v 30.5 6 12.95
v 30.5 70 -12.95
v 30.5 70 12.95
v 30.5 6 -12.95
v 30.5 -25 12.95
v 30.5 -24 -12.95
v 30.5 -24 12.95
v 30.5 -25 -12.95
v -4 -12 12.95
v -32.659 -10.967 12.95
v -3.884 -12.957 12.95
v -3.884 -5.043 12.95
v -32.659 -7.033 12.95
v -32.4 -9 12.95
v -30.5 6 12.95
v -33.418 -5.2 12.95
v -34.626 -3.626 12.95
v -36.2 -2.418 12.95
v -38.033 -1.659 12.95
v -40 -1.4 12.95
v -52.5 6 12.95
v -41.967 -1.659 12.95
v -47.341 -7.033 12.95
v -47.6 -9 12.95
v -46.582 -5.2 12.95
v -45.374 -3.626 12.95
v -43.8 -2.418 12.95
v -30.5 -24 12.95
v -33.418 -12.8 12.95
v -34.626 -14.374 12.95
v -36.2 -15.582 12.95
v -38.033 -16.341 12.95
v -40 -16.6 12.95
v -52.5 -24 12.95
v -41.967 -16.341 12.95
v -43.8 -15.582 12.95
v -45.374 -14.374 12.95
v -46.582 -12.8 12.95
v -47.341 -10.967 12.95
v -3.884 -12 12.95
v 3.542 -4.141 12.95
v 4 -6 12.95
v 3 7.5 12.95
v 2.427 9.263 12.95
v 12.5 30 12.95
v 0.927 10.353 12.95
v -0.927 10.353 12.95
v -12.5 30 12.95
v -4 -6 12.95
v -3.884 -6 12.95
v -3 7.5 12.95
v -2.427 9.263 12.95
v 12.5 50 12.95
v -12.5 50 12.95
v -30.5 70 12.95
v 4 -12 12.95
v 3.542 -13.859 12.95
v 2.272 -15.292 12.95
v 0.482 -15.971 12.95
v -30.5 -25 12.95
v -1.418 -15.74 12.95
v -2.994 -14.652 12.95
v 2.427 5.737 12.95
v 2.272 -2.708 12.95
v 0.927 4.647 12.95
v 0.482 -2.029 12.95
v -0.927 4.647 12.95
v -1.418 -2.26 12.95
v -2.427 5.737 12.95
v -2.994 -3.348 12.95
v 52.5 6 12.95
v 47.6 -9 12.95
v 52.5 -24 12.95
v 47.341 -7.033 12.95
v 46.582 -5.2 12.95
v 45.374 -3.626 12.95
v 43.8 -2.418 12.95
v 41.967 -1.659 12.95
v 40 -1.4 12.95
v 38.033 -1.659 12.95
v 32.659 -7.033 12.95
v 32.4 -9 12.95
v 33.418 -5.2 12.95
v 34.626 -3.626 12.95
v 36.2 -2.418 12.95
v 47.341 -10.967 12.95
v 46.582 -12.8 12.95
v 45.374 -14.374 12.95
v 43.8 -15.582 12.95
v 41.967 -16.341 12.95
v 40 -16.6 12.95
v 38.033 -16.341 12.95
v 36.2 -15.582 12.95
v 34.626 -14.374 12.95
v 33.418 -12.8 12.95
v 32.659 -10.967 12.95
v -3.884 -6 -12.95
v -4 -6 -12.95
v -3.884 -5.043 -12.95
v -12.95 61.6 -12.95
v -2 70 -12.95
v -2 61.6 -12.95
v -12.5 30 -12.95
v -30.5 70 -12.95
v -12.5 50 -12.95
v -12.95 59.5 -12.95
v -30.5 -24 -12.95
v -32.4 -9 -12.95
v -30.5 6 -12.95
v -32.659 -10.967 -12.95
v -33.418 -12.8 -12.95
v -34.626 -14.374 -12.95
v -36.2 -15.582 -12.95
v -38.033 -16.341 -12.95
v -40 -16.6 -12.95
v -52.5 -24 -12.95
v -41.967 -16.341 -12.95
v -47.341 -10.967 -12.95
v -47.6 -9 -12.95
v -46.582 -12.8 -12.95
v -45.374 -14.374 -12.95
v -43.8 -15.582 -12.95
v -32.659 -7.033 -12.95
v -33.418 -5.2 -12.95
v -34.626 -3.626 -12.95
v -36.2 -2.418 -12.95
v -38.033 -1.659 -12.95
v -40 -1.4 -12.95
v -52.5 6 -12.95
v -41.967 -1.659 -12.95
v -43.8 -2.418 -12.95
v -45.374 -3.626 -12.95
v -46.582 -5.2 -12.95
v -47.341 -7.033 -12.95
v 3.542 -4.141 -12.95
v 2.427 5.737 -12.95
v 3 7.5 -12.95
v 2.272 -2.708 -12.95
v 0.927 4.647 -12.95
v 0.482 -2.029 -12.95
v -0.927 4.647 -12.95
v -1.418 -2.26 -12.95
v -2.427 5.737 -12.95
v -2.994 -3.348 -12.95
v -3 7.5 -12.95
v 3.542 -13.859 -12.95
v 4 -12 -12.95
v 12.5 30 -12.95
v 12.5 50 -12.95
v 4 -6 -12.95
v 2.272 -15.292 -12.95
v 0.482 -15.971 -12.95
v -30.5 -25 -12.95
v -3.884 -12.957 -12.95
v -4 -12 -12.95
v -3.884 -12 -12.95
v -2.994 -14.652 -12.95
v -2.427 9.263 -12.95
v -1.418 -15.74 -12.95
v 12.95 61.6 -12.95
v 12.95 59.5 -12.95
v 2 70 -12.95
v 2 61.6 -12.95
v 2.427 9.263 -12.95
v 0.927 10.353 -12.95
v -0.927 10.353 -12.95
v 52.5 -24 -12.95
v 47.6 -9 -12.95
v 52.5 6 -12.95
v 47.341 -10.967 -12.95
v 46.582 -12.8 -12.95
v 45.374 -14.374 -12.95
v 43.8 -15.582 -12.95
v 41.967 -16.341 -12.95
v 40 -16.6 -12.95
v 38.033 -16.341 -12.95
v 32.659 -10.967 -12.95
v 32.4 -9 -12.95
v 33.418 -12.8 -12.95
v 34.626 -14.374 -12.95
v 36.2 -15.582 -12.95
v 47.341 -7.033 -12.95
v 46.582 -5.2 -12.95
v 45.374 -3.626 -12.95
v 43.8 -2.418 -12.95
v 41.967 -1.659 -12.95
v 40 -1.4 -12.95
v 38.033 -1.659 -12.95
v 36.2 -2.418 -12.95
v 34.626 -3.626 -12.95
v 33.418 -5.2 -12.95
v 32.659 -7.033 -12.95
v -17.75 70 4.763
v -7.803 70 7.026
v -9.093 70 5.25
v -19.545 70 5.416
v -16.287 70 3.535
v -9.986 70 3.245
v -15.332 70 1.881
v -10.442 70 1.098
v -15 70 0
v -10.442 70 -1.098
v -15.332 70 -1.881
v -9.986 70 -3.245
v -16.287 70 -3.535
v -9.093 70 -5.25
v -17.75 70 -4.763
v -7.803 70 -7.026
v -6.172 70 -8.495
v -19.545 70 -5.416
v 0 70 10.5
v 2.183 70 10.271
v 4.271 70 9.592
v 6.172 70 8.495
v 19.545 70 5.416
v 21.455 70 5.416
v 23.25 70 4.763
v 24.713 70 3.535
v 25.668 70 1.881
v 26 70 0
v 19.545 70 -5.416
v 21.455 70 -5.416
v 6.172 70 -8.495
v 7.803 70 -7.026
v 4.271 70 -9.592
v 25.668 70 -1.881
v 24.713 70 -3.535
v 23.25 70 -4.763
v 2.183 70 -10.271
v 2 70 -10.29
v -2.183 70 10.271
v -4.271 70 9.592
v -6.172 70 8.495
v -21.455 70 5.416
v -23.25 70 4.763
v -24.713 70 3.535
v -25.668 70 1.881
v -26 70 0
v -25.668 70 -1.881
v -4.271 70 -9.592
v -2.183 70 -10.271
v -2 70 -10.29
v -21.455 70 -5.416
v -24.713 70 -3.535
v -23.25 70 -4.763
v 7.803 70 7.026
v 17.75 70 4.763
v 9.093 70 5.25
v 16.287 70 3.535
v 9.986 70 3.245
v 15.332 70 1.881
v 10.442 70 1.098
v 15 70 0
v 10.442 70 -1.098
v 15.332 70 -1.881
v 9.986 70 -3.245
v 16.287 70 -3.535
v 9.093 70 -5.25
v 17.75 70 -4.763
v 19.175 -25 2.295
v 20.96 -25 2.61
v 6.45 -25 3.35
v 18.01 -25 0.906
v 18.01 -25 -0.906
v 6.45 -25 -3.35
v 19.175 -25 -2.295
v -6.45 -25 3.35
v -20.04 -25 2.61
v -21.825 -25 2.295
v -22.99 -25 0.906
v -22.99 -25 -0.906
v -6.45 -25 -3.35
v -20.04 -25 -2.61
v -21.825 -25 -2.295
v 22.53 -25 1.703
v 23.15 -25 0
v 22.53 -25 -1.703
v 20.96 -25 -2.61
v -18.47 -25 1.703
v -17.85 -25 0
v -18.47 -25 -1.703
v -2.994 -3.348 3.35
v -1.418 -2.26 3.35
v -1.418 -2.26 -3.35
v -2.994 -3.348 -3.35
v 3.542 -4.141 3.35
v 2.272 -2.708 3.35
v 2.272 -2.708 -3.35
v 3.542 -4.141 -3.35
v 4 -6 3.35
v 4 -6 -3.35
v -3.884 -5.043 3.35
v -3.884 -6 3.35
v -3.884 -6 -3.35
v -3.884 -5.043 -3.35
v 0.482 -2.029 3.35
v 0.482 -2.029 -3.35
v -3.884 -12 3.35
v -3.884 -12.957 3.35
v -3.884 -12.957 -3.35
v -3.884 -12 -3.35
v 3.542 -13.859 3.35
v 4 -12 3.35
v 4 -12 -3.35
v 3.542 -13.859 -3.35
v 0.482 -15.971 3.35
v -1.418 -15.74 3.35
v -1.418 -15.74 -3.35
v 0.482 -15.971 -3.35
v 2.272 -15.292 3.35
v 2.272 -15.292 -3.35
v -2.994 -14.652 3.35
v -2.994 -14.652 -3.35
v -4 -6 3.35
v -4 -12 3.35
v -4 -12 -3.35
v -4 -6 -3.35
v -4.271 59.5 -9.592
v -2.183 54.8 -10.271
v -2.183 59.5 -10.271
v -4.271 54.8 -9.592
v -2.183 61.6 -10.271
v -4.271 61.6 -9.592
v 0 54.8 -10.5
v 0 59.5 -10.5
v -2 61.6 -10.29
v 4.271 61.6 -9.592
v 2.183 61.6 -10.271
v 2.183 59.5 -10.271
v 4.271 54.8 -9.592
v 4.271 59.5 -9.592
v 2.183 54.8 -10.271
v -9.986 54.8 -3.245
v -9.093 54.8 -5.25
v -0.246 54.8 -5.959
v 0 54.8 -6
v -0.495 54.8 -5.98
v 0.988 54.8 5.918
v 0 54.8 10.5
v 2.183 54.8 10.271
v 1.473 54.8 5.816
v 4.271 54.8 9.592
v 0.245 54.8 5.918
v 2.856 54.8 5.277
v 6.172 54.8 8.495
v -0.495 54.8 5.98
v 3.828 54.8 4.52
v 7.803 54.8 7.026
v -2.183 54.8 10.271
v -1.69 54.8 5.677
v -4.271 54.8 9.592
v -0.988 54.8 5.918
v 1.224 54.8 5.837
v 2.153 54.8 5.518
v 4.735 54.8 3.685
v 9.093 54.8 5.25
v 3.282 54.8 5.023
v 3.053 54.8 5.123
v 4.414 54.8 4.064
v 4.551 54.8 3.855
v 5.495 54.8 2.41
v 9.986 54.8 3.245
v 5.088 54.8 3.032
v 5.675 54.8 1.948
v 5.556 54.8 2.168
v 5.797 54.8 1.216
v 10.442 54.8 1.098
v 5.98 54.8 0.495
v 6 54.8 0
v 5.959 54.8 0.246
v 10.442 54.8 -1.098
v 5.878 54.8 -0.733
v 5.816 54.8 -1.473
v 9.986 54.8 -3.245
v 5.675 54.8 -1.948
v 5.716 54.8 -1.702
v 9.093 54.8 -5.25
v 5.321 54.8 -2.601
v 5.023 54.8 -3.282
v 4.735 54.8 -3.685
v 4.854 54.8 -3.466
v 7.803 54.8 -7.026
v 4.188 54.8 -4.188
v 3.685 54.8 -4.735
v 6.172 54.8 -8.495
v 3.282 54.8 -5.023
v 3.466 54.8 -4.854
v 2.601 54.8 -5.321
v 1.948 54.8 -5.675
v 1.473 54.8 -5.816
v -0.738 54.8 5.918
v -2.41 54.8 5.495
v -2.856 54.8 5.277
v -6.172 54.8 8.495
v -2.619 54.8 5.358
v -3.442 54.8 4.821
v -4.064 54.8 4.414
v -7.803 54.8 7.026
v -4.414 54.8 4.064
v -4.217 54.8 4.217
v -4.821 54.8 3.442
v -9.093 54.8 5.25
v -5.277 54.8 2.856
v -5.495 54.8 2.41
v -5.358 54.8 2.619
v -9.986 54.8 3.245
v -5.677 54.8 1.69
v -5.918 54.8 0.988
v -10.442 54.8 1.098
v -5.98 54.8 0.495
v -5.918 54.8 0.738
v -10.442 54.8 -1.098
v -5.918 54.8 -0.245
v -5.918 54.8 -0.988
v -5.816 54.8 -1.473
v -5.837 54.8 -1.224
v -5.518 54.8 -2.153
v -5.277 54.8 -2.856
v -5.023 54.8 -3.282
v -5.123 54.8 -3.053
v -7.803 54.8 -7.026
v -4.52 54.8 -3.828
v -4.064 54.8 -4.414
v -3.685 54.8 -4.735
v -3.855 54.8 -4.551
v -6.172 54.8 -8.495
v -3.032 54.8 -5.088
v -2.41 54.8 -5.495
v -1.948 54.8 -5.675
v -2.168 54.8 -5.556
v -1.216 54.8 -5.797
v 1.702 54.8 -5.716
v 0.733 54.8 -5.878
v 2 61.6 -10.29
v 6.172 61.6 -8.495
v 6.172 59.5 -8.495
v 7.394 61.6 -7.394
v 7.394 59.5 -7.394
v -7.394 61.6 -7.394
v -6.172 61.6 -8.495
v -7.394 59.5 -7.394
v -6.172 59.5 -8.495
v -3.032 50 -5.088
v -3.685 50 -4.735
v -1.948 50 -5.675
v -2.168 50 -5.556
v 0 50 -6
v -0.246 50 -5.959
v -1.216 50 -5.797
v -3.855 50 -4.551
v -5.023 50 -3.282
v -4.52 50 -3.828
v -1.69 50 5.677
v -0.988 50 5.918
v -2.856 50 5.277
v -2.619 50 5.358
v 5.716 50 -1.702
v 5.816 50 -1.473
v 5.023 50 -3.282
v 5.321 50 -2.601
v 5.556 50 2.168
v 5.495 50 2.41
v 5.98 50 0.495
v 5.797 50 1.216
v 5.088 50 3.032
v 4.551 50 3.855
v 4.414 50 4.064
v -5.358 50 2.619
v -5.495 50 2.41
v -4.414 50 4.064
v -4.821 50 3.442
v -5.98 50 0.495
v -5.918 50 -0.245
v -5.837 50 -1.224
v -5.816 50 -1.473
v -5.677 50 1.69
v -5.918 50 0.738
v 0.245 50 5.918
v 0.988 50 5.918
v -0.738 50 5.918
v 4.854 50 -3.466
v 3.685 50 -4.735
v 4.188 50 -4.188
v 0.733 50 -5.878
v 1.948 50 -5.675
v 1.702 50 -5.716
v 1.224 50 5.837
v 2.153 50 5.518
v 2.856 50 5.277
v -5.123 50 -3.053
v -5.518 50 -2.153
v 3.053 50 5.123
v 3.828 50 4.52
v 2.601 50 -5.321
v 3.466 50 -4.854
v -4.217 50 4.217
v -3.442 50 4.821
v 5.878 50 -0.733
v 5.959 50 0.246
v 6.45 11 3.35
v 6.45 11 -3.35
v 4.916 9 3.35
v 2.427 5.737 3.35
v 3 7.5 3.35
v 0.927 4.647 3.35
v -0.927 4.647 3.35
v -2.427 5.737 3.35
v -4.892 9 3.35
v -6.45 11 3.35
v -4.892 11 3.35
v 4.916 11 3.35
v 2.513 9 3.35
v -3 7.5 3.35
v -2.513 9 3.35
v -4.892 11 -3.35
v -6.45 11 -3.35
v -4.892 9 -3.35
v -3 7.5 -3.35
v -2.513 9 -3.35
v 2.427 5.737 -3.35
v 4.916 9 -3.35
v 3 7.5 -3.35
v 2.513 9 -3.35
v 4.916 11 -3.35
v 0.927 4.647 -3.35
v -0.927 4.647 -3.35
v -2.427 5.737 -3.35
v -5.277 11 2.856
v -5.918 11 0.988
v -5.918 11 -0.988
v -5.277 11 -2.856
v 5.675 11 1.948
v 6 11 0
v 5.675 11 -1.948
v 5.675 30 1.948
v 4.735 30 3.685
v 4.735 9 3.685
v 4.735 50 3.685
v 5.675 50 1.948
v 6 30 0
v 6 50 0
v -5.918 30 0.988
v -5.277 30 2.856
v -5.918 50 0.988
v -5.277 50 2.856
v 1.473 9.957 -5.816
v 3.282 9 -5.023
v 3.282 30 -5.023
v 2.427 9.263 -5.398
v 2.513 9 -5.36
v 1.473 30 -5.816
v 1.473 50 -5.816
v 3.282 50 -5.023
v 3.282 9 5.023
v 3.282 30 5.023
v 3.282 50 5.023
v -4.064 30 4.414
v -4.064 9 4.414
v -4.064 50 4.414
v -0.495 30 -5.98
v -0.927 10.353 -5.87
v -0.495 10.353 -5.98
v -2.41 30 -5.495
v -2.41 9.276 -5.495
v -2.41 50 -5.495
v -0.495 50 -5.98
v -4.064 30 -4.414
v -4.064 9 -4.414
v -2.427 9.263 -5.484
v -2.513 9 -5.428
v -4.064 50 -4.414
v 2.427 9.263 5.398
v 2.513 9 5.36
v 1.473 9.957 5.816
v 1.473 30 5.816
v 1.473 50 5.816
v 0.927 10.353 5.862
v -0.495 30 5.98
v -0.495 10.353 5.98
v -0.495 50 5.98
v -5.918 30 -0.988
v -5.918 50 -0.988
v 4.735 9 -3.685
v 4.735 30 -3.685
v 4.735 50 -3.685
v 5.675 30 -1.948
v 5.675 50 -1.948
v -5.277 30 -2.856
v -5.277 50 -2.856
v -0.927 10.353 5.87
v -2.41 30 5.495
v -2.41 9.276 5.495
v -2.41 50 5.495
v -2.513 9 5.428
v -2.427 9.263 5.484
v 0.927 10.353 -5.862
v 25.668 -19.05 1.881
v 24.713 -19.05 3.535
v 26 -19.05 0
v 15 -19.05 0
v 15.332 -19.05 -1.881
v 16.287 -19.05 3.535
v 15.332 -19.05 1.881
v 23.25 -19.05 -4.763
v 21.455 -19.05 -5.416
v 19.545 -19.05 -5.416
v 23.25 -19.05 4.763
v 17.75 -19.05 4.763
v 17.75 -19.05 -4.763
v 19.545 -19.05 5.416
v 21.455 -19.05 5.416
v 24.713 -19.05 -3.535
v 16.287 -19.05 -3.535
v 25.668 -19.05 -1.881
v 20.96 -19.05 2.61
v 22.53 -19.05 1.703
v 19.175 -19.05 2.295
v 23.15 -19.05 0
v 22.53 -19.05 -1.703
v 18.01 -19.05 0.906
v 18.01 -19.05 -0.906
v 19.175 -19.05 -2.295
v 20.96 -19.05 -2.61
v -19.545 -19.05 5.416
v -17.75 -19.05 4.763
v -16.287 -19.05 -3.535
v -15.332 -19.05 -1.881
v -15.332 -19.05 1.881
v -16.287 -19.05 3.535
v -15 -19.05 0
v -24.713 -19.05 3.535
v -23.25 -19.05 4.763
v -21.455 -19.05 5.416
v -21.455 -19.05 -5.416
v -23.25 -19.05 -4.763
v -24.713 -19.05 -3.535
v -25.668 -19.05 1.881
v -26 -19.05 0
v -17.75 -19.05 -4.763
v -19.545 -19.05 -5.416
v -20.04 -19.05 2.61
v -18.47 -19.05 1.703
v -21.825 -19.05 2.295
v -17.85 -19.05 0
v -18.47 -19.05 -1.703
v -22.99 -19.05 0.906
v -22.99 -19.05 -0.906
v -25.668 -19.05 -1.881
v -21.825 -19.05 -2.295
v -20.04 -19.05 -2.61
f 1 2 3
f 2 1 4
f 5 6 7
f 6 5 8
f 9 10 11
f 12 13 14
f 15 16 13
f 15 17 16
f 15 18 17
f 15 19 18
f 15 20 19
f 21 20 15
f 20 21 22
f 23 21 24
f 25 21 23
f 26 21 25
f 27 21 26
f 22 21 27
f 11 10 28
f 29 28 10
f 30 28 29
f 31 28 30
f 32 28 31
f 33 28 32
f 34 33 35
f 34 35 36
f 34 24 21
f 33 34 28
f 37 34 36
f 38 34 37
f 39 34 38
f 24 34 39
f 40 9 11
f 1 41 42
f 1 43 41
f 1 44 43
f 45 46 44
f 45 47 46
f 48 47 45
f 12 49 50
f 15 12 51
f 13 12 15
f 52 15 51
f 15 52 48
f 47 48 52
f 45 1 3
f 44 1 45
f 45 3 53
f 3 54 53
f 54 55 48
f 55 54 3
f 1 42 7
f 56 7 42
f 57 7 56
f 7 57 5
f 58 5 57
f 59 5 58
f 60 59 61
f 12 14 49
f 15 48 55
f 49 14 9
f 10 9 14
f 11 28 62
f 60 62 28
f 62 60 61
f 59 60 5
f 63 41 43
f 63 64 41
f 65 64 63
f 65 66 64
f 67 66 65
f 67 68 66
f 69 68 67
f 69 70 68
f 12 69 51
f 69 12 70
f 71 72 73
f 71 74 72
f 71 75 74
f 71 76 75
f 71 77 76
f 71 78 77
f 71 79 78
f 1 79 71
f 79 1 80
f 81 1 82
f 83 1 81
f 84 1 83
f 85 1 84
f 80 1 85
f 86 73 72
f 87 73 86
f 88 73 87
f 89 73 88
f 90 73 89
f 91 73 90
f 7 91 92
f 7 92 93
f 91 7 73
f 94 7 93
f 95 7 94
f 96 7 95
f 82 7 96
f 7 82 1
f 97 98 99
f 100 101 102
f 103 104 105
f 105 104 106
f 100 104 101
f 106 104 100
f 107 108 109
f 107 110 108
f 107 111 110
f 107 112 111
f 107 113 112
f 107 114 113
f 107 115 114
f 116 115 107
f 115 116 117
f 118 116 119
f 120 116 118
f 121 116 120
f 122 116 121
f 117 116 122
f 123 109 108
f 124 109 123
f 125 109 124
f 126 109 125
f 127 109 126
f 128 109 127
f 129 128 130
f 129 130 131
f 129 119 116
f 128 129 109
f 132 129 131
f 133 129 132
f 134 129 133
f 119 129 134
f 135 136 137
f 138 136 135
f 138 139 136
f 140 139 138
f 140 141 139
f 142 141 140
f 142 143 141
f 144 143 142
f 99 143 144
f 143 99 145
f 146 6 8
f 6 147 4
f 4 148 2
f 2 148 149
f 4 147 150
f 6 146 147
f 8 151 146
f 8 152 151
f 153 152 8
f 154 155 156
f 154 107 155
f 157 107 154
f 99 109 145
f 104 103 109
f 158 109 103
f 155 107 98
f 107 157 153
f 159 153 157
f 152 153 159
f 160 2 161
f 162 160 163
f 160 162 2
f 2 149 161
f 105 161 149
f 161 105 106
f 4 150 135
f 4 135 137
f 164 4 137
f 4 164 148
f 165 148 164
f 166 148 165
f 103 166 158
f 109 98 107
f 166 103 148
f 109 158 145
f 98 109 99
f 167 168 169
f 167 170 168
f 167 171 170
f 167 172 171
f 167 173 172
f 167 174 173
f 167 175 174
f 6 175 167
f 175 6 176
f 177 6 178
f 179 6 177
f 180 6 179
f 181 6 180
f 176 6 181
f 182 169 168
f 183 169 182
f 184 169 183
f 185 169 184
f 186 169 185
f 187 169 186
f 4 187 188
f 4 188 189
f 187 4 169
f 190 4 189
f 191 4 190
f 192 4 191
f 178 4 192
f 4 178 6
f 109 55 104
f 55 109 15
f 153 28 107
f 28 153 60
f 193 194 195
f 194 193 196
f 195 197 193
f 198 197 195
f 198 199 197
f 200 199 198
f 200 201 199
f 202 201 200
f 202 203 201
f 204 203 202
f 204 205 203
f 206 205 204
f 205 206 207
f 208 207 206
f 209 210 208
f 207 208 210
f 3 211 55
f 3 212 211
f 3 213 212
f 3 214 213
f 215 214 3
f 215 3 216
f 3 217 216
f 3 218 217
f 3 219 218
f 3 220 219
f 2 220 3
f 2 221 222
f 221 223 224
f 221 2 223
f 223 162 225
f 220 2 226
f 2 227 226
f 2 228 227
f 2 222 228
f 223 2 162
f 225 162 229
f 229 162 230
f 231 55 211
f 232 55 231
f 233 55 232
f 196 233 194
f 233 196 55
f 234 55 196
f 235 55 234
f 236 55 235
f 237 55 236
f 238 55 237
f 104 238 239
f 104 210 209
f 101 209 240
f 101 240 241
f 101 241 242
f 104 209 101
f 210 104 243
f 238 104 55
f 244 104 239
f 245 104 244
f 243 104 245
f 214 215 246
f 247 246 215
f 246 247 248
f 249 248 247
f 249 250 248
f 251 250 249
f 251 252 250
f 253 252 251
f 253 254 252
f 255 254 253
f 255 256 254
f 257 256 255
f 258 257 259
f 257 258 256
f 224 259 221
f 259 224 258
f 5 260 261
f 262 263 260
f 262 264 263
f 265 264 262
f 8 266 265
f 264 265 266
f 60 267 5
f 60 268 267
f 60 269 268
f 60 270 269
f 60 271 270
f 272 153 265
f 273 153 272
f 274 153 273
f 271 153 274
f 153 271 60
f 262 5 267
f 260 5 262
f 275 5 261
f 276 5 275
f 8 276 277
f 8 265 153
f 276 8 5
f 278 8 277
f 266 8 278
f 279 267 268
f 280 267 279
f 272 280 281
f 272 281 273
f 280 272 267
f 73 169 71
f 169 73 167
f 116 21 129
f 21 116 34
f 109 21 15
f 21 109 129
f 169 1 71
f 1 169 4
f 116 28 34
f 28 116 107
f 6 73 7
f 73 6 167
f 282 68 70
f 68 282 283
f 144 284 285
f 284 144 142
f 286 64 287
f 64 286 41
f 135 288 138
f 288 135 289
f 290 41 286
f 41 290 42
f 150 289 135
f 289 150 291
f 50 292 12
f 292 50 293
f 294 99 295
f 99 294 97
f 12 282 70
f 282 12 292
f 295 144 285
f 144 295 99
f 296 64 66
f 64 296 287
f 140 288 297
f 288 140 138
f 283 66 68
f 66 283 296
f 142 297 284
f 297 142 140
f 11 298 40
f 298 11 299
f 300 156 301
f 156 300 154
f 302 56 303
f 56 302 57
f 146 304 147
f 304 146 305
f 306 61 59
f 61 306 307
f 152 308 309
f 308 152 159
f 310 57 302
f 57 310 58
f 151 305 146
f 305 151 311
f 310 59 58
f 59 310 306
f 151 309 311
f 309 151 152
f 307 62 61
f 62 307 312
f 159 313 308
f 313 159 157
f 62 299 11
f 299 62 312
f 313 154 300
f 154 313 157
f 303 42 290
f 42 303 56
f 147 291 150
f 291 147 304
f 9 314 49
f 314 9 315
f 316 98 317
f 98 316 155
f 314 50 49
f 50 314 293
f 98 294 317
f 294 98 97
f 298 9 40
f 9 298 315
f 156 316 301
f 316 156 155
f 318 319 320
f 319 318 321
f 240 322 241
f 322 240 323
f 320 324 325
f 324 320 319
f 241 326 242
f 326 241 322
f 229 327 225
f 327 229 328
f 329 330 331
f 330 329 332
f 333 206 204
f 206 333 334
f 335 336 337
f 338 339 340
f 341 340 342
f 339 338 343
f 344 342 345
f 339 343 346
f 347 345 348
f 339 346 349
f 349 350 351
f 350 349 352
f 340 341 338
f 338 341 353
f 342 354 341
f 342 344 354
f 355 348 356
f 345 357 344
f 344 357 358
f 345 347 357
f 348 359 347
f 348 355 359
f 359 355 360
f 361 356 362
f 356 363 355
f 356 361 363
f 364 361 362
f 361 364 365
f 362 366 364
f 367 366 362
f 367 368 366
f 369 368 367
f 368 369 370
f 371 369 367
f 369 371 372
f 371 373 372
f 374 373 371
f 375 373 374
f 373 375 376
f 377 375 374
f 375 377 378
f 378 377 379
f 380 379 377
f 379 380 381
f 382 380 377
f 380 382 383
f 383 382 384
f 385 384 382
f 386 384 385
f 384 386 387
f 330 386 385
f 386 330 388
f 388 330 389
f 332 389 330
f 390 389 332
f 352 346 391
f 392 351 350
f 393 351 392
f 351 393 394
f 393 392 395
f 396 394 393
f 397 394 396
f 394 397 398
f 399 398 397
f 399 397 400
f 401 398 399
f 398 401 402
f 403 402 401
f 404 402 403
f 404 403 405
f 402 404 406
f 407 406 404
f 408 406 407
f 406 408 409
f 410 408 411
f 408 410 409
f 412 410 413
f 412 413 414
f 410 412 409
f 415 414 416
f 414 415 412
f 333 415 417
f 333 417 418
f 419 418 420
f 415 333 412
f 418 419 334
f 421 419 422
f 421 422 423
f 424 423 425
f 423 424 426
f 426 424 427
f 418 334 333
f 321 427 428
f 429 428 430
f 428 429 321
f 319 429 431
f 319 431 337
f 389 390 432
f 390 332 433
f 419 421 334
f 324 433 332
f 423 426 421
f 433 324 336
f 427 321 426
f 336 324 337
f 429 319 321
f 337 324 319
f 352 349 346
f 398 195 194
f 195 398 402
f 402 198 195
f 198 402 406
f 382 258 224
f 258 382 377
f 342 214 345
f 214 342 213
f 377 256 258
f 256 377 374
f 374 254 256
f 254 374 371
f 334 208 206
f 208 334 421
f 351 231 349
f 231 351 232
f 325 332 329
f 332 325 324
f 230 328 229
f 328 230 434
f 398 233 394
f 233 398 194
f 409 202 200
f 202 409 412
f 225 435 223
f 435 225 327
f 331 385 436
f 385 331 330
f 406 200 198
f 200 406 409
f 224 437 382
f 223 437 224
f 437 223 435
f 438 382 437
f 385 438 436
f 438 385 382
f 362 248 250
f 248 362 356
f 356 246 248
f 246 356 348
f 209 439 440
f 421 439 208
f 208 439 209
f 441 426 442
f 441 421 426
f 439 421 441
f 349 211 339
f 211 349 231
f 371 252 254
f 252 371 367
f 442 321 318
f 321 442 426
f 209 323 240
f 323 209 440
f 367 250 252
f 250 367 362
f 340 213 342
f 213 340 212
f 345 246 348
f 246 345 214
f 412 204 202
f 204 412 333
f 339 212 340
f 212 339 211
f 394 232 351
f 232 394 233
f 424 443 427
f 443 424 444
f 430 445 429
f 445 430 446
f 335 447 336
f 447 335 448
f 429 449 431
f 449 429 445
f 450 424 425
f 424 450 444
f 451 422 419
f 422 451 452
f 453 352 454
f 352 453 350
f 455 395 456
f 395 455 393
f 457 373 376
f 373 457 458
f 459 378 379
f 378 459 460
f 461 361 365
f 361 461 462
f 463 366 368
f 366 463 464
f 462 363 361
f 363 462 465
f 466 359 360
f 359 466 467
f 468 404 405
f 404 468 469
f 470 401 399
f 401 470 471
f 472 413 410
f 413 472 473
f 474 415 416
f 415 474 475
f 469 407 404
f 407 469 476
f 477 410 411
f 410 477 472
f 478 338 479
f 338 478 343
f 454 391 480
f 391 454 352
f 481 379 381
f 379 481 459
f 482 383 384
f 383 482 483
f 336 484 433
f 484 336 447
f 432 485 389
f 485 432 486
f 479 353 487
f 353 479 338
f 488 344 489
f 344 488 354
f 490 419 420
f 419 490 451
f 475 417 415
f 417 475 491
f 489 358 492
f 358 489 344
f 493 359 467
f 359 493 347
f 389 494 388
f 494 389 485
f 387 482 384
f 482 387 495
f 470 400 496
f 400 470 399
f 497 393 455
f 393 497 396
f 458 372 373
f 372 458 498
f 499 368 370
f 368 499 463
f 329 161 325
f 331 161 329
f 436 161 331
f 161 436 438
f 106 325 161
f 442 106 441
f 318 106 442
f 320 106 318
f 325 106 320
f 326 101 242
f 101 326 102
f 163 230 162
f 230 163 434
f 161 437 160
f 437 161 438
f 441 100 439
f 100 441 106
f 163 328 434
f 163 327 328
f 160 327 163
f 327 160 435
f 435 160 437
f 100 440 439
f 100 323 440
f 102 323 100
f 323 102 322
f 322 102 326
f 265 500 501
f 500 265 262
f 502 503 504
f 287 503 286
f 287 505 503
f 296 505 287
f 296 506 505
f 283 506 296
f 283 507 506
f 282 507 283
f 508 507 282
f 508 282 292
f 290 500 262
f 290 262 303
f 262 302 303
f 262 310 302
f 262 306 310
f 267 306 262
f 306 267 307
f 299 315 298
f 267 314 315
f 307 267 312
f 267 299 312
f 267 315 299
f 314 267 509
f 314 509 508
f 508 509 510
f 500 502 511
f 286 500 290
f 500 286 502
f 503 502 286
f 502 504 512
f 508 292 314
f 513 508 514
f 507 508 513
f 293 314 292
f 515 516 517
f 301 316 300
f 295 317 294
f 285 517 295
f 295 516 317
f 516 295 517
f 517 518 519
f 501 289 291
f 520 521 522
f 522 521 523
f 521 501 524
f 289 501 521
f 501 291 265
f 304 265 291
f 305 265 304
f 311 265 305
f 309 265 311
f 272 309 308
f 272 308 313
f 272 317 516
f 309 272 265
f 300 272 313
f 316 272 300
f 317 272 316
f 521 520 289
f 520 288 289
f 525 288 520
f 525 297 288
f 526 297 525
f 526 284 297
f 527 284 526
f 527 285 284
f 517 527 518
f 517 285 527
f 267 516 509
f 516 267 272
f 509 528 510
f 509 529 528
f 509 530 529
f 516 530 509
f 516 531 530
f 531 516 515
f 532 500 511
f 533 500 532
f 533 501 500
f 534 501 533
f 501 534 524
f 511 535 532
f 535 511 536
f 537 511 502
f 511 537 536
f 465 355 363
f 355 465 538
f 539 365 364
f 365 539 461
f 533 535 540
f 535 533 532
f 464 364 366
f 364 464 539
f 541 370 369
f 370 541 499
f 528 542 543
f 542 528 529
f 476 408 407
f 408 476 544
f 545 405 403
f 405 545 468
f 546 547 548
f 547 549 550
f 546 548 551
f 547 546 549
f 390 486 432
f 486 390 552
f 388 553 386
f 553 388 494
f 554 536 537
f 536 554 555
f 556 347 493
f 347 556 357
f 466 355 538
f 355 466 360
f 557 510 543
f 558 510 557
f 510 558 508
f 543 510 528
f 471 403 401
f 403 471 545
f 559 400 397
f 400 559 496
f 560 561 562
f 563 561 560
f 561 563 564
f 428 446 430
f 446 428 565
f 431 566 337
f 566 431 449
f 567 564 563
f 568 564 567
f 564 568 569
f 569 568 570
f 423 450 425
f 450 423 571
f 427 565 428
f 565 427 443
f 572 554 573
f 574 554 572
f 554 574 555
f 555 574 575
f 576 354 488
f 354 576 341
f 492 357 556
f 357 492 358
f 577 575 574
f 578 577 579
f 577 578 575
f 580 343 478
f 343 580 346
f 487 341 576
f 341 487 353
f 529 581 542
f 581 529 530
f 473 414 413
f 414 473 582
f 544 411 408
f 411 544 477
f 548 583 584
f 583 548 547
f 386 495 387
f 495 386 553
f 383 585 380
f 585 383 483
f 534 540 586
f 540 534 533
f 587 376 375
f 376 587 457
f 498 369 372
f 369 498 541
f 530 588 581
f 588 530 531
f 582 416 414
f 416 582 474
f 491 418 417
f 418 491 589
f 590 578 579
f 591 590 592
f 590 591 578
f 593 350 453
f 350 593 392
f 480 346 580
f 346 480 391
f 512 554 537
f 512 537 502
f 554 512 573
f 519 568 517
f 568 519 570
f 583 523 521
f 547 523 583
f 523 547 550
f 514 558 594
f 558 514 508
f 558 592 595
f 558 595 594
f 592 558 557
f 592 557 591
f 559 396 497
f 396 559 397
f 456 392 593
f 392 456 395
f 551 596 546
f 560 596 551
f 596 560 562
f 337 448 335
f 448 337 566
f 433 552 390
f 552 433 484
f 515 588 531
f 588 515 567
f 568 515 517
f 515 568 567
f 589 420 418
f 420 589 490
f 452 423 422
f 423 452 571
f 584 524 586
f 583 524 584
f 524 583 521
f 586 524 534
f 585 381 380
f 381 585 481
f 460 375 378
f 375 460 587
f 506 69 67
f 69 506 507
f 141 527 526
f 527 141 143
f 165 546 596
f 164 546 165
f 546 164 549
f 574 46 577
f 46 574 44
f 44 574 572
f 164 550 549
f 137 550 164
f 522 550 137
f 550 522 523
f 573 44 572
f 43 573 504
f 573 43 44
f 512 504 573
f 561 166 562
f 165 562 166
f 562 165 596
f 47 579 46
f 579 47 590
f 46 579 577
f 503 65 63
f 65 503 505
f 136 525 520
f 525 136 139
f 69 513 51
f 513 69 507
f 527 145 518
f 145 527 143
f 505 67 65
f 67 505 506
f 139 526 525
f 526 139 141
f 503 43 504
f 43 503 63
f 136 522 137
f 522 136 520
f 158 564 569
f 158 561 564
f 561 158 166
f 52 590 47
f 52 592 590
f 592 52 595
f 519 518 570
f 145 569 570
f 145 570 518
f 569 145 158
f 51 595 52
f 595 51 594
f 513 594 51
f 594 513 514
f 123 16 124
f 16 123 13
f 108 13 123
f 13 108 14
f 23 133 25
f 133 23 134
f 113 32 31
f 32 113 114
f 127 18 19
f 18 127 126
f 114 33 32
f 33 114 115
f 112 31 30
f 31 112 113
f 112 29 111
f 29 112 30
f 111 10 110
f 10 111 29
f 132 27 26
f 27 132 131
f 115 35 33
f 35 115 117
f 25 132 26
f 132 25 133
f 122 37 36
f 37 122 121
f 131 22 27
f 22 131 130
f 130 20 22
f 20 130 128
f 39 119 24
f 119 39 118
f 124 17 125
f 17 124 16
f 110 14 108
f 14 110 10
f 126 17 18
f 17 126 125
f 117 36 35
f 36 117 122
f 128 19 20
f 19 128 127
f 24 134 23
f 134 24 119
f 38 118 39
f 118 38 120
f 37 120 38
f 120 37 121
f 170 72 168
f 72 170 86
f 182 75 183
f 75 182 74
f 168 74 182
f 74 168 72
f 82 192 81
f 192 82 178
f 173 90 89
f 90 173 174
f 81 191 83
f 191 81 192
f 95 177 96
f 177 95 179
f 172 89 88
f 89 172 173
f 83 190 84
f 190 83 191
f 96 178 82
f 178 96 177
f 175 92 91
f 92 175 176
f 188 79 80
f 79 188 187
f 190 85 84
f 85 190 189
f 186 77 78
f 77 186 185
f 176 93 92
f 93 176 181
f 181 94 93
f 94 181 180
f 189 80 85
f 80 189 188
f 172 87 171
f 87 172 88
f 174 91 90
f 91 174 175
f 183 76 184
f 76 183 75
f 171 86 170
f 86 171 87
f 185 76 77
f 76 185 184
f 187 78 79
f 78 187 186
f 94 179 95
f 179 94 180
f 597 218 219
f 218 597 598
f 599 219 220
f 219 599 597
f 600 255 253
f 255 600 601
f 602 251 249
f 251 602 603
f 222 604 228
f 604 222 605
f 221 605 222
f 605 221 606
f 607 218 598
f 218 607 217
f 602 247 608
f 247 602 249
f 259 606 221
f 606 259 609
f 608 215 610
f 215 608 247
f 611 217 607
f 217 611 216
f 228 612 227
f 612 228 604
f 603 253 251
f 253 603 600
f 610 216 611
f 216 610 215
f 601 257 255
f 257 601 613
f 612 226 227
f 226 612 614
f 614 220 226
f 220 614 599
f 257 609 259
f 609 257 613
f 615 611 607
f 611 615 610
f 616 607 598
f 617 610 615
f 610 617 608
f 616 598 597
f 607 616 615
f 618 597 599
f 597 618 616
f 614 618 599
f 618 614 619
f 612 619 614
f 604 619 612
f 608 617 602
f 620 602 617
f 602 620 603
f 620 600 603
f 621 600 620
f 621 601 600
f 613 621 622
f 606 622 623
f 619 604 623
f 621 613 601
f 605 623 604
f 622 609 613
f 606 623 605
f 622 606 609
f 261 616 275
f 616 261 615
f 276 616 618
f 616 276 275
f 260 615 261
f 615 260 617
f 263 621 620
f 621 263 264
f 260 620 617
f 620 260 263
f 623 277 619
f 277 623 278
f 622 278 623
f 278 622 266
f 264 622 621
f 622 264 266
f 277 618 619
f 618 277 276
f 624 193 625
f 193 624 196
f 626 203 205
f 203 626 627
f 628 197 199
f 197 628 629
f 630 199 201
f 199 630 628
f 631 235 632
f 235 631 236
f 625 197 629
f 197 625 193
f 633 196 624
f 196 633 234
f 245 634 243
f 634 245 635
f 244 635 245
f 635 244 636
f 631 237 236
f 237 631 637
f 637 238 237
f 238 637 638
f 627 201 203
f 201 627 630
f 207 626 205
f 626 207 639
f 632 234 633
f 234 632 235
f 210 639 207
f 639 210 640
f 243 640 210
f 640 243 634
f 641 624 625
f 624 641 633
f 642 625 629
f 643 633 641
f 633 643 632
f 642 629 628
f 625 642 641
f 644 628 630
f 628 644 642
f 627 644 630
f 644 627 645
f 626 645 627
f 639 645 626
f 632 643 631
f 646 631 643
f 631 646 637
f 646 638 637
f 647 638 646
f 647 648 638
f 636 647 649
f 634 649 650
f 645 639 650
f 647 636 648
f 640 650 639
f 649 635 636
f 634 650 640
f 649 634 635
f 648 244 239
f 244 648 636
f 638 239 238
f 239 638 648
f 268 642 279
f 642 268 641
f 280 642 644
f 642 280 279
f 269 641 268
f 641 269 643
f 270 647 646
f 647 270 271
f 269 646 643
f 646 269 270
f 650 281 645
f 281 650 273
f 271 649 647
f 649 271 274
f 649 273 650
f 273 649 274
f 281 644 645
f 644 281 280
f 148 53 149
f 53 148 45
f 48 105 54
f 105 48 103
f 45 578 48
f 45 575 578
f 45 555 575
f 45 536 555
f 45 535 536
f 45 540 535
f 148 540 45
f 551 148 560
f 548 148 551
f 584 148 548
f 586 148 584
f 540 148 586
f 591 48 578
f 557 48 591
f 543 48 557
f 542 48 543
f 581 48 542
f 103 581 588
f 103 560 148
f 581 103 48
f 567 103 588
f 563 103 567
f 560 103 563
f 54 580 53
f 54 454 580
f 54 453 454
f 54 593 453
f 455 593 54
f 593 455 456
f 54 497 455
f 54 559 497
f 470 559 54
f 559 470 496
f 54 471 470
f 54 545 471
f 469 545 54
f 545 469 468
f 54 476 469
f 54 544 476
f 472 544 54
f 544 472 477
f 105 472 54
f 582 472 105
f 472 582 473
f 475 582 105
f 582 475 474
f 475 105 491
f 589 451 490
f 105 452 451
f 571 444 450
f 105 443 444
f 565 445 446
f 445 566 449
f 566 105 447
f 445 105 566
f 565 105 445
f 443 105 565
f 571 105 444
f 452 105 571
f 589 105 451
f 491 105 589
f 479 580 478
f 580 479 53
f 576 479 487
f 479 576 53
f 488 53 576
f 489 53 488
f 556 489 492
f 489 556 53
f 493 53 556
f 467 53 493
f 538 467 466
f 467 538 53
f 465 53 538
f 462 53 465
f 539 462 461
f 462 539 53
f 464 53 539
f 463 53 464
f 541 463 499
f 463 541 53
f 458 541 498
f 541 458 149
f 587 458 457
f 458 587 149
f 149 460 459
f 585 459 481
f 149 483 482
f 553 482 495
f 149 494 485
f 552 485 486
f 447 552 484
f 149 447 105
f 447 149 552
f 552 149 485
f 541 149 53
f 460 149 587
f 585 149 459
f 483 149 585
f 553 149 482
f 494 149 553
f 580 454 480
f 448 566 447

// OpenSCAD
// file: configuration.scad
// eMAKEr Huxley
// Configuration file
// GNU GPL v3
// Jean-Marc Giacalone
// info@emakershop.com
// www.emakershop.com
// http://www.reprap.org/wiki/EMAKER_Huxley
// http://github.com/jmgiacalone/eMAKERHuxley

//use <library.scad>

//Round corner diameter
round_corner_diameter = 8;

//Thin wall size
layer_height = 0.4;
perimeter_width_over_thicknes = 1.6;
infill_widht_over_thickness = 1.55;
thin_wall = 2*(perimeter_width_over_thicknes*layer_height+infill_widht_over_thickness*layer_height);
if(thin_wall<2){
	echo("Check thin wall size, its below 2mm!");
}
echo(thin_wall);

// MINI-HUXLEY VERSION (TODO, just place holder)
// include <configuration-huxley.scad>
m8_diameter=8.3;
m5_diameter=5.3;
m4_diameter=4.3;
m3_diameter=3.3;
m3_dia_clr=3.5;
m3_nut = 2.8;
m3_af = 5.8;
m6_diameter = 6;
m6_nut = 11.5;
bushing_diameter = 8;
motor_shaft=5.3;
bushing_rodsize = 6;
bushing_outerDiameter = 12;
bushing_lenght = 8;

// Some basic functions, probably should be somewhere else
// main file
include <configuration.scad>

// We want to be 40mm above the beam.
// The block on which the XRodMound it 'mounted' is already 24mm above the beam.
center_height = 40;
block_height = 24;
flange_hole_height = center_height - block_height;
width=26;

module XRodMountBase() {
		translate([0,22.5,0]) cube([61,95,width-0.1], center = true);
		translate([0,(-25+flange_hole_height),0]) cube([105,30,width-0.1], center = true);
}

module oval() {
			cylinder(h=width+0.1, r=4, center=true);
			translate([0,-6,0]) cylinder(h=width+0.1, r=4, center=true);
			translate([-4,-6,-(width+0.1)/2]) cube([8,6,width+0.1]);
}

module XRodMount(){
	difference(){
		XRodMountBase();
		// Square hole for...
		translate([0,-14,0])cube([12.9,50,6.7],center =true);

		// Cylinder must be aligned with motor shaft height whose center is 40mm above the 
		// beam. This piece is to be mounted on the Rail which is at 24mm above the beam.
	   // hence we need more 16 mm.
		//translate([0,(-25+flange_hole_height),0]) cylinder(h=width+0.1, r=4, center=true);
		translate([0,(-25+flange_hole_height)+3,0]) oval();

		// 'Base Hole' for laser module and wires
		translate([0,37,0]) rotate(a=[90,0,0]) cylinder(r=6, h=56, center = true);
		translate([0,7.5,0]) cylinder(r=3, h=width+.1, center = true);

       // Hole for bearings
       translate([-40,(-25+flange_hole_height),0]) cylinder(h=width, r=7.6, center=true);
       translate([+40,(-25+flange_hole_height),0]) cylinder(h=width, r=7.6, center=true);

		 // M5 Mount point to rail block
       translate([20.5,32,0]) rotate(a=[90,0,0]) cylinder(r=5.5, h=102.1, center=true);
       translate([20.5,-20,0]) rotate(a=[90,0,0]) cylinder(r=m5_diameter/2, h=10.1, center=true);
       translate([-20.5,32,0]) rotate(a=[90,0,0]) cylinder(r=5.5, h=102.1, center=true);
       translate([-20.5,-20,0]) rotate(a=[90,0,0]) cylinder(r=m5_diameter/2, h=10.1, center=true);

		 // Square hole for placing laser module holder
        rotate(a=[0,90,0]) translate([0,40,0]) cube([60,20,25], center=true);

		translate([0,62.5,0]) rotate(a=[270,90,0]) Iris();	
	}
}

module arc(radius, degree, height) {
    l=radius/cos(degree/2);
    linear_extrude(height = height) {
        intersection() {
            circle(r=radius,$fn=200);
            polygon(points=[[0,0],[0,l],[l*sin(degree),l*cos(degree)]], paths=[[0,1,2]]);
        }
    }
}

module Iris() {
    cylinder(r=10.5,h=15.4, center=true);
    translate([0,0,-(15.4+19)/2]) cylinder(r=6,h=19, center=true);
    translate([21,0,3]) cube([22,4,12], center=true);
    translate([0,0,-3]) rotate(a=[0,0,-45]) arc(17+11,90,2.1);
}

XRodMount();
